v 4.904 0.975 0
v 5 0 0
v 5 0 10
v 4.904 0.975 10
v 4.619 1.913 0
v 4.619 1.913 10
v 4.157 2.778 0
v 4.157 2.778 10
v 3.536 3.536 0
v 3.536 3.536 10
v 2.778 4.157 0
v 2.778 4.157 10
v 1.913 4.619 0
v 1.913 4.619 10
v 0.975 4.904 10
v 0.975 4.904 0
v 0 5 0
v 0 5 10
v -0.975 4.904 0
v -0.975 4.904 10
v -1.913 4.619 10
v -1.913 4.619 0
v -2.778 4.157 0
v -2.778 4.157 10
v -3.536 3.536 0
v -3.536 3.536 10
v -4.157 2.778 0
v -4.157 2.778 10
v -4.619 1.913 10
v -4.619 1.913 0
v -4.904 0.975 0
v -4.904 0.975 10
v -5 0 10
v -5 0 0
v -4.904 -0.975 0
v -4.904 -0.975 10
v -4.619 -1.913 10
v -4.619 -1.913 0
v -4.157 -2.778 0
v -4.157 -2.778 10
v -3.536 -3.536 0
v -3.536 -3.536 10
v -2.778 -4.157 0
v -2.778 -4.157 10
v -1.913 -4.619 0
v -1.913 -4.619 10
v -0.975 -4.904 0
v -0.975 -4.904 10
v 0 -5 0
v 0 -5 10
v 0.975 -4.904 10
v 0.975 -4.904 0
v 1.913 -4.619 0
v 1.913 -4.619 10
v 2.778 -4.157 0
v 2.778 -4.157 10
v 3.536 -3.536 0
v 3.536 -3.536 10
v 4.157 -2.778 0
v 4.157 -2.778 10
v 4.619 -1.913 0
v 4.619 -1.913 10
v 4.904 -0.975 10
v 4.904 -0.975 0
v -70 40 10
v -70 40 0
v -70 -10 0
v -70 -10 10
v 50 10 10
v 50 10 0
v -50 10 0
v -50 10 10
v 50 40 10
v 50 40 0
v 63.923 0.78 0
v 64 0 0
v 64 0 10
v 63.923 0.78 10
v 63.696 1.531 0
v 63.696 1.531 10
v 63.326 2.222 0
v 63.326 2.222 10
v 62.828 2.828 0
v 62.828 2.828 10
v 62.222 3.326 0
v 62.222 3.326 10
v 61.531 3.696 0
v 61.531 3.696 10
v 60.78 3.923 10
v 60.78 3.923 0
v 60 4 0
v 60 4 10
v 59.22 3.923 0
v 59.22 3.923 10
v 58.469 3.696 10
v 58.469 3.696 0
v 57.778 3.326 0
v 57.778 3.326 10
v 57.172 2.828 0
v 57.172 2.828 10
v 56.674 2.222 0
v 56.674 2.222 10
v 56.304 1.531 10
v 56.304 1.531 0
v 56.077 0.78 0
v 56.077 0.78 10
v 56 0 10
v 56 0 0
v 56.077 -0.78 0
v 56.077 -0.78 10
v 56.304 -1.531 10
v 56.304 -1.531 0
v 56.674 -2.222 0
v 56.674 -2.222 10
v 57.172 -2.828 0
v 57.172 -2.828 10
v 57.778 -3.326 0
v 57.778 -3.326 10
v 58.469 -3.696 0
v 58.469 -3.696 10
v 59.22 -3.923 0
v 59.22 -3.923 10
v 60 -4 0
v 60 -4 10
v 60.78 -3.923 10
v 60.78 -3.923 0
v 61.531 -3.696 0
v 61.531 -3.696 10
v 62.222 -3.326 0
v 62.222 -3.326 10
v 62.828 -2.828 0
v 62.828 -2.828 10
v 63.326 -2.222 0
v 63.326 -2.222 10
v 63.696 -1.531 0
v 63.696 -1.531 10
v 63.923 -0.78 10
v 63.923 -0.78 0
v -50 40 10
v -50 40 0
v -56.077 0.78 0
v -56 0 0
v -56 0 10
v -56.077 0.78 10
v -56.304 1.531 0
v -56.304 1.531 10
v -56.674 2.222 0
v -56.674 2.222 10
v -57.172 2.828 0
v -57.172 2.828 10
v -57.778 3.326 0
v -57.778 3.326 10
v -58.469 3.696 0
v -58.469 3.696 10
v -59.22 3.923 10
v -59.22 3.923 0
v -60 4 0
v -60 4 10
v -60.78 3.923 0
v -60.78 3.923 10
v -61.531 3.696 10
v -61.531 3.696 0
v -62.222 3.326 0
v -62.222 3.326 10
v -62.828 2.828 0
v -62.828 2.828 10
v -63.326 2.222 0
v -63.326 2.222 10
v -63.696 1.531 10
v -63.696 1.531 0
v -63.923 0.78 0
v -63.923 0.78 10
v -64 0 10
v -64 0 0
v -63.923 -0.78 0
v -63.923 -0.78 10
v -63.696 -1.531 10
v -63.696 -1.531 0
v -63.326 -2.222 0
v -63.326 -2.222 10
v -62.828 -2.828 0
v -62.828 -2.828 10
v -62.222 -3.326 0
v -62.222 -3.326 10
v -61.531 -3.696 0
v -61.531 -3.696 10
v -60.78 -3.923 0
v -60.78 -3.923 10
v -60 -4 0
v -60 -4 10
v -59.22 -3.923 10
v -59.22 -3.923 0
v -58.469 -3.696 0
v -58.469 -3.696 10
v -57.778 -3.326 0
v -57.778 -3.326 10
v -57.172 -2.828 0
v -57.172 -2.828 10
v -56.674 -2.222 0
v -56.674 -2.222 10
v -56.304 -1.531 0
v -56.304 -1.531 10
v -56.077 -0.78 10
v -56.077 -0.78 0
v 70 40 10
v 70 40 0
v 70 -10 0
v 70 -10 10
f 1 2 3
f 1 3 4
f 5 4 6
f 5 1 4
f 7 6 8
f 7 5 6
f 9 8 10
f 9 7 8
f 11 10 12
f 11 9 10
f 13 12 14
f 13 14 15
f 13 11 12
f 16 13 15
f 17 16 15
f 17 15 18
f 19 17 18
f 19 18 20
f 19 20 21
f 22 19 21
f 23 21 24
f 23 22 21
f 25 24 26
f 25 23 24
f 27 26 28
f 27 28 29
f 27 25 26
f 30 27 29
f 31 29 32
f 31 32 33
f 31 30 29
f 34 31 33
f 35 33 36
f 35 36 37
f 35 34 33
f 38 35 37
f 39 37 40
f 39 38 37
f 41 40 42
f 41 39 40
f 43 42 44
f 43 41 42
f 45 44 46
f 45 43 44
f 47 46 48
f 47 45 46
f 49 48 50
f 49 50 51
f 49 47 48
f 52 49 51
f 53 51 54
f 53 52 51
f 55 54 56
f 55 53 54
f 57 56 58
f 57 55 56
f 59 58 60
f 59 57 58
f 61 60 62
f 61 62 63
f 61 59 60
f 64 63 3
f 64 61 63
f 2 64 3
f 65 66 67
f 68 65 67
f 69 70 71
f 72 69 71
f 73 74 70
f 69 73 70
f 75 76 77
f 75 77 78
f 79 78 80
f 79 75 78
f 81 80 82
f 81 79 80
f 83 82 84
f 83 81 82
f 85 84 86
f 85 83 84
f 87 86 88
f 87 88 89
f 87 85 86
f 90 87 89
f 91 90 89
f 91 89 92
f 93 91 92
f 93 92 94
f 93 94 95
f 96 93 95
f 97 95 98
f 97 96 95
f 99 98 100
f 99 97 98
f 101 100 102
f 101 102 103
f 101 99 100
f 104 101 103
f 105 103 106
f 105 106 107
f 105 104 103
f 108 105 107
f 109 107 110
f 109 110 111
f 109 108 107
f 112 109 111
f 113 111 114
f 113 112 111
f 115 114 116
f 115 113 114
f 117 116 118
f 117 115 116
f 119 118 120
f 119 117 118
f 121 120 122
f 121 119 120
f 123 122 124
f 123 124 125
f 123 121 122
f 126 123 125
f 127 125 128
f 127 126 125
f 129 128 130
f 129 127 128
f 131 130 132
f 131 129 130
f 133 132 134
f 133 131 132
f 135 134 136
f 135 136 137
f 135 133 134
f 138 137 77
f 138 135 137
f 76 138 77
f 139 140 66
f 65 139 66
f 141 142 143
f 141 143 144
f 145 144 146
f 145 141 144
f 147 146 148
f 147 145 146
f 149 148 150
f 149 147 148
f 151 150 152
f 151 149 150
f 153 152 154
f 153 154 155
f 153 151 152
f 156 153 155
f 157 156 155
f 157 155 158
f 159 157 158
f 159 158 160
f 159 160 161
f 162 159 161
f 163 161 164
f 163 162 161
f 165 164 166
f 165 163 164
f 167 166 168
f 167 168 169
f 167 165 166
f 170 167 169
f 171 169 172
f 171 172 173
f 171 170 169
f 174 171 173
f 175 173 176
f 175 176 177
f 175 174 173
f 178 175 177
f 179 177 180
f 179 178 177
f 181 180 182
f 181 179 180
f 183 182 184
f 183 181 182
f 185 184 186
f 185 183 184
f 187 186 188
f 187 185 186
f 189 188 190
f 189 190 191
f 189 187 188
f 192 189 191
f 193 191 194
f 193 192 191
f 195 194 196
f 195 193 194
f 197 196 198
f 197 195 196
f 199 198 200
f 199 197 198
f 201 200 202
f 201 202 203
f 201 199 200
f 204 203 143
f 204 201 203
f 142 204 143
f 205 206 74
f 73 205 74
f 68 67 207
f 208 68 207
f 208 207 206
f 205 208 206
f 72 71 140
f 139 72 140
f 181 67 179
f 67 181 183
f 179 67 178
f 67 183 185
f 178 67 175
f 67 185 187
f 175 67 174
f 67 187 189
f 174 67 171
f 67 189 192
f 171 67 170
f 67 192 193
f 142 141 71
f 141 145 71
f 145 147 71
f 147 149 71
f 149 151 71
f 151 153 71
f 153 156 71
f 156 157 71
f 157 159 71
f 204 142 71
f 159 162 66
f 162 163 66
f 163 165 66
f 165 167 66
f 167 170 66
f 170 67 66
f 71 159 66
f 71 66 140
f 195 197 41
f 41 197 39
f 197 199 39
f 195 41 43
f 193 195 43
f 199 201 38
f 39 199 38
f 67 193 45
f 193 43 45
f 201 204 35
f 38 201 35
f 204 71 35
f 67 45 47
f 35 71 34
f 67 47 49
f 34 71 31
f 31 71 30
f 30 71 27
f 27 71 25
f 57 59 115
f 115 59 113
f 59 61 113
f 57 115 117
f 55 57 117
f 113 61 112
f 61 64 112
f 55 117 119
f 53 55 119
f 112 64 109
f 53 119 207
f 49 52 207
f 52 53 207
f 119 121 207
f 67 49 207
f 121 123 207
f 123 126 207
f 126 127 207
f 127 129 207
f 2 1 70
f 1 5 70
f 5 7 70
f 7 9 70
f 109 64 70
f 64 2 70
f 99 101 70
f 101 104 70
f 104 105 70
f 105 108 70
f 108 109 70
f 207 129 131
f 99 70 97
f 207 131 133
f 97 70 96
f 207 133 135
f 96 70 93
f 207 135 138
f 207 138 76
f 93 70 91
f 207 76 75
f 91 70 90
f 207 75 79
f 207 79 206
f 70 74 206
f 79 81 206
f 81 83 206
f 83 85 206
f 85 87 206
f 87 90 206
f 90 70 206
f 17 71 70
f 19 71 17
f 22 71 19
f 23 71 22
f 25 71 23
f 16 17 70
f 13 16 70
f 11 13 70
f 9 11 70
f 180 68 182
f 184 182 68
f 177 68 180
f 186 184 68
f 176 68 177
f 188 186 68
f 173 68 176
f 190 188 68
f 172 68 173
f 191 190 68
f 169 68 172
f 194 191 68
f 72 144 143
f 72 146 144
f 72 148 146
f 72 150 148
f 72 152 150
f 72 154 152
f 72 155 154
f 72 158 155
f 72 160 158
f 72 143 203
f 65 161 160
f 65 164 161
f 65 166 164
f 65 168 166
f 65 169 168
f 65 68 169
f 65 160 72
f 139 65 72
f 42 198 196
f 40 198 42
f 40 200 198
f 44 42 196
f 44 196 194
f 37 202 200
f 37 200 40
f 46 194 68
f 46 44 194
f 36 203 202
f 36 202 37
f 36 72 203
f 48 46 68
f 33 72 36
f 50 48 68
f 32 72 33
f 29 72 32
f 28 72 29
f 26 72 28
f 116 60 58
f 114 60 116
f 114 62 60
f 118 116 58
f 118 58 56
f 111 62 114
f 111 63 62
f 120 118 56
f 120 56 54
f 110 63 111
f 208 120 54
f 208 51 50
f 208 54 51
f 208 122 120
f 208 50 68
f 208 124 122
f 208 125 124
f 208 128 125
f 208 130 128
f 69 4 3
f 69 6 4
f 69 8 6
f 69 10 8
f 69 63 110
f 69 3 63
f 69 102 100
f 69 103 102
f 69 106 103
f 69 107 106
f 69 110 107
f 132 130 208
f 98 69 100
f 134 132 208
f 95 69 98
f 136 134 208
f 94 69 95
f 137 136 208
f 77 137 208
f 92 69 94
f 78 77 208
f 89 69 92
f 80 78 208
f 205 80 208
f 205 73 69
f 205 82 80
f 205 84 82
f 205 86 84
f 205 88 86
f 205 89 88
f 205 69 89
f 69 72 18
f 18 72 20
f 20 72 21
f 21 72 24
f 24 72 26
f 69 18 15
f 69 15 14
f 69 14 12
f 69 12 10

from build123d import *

# Parameters (mm, degrees)
ESQUISSE1_R        = 4
ESQUISSE1_R_2      = 5
BOSS_EXTRU_1_DEPTH = 10


with BuildPart() as part:
    # Esquisse1 → Boss.-Extru.1 (new body)
    with BuildSketch(Plane.XY):
        Polygon((-70, 40), (-70, 10), (-70, -10), (70, -10), (70, 10), (70, 40), (50, 40), (50, 10), (-50, 10), (-50, 40), align=None)
        with Locations((-60, 0)):
            Circle(ESQUISSE1_R, mode=Mode.SUBTRACT)
        Circle(ESQUISSE1_R_2, mode=Mode.SUBTRACT)
        with Locations((60, 0)):
            Circle(ESQUISSE1_R, mode=Mode.SUBTRACT)
        Polygon((-70, 40), (-70, 10), (-70, -10), (70, -10), (70, 10), (70, 40), (50, 40), (50, 10), (-50, 10), (-50, 40), align=None)
        with Locations((-60, 0)):
            Circle(ESQUISSE1_R, mode=Mode.SUBTRACT)
        Circle(ESQUISSE1_R_2, mode=Mode.SUBTRACT)
        with Locations((60, 0)):
            Circle(ESQUISSE1_R, mode=Mode.SUBTRACT)
        Polygon((-70, 40), (-70, 10), (-70, -10), (70, -10), (70, 10), (70, 40), (50, 40), (50, 10), (-50, 10), (-50, 40), align=None)
        with Locations((-60, 0)):
            Circle(ESQUISSE1_R, mode=Mode.SUBTRACT)
        Circle(ESQUISSE1_R_2, mode=Mode.SUBTRACT)
        with Locations((60, 0)):
            Circle(ESQUISSE1_R, mode=Mode.SUBTRACT)
    extrude(amount=BOSS_EXTRU_1_DEPTH)


solid = part.part
